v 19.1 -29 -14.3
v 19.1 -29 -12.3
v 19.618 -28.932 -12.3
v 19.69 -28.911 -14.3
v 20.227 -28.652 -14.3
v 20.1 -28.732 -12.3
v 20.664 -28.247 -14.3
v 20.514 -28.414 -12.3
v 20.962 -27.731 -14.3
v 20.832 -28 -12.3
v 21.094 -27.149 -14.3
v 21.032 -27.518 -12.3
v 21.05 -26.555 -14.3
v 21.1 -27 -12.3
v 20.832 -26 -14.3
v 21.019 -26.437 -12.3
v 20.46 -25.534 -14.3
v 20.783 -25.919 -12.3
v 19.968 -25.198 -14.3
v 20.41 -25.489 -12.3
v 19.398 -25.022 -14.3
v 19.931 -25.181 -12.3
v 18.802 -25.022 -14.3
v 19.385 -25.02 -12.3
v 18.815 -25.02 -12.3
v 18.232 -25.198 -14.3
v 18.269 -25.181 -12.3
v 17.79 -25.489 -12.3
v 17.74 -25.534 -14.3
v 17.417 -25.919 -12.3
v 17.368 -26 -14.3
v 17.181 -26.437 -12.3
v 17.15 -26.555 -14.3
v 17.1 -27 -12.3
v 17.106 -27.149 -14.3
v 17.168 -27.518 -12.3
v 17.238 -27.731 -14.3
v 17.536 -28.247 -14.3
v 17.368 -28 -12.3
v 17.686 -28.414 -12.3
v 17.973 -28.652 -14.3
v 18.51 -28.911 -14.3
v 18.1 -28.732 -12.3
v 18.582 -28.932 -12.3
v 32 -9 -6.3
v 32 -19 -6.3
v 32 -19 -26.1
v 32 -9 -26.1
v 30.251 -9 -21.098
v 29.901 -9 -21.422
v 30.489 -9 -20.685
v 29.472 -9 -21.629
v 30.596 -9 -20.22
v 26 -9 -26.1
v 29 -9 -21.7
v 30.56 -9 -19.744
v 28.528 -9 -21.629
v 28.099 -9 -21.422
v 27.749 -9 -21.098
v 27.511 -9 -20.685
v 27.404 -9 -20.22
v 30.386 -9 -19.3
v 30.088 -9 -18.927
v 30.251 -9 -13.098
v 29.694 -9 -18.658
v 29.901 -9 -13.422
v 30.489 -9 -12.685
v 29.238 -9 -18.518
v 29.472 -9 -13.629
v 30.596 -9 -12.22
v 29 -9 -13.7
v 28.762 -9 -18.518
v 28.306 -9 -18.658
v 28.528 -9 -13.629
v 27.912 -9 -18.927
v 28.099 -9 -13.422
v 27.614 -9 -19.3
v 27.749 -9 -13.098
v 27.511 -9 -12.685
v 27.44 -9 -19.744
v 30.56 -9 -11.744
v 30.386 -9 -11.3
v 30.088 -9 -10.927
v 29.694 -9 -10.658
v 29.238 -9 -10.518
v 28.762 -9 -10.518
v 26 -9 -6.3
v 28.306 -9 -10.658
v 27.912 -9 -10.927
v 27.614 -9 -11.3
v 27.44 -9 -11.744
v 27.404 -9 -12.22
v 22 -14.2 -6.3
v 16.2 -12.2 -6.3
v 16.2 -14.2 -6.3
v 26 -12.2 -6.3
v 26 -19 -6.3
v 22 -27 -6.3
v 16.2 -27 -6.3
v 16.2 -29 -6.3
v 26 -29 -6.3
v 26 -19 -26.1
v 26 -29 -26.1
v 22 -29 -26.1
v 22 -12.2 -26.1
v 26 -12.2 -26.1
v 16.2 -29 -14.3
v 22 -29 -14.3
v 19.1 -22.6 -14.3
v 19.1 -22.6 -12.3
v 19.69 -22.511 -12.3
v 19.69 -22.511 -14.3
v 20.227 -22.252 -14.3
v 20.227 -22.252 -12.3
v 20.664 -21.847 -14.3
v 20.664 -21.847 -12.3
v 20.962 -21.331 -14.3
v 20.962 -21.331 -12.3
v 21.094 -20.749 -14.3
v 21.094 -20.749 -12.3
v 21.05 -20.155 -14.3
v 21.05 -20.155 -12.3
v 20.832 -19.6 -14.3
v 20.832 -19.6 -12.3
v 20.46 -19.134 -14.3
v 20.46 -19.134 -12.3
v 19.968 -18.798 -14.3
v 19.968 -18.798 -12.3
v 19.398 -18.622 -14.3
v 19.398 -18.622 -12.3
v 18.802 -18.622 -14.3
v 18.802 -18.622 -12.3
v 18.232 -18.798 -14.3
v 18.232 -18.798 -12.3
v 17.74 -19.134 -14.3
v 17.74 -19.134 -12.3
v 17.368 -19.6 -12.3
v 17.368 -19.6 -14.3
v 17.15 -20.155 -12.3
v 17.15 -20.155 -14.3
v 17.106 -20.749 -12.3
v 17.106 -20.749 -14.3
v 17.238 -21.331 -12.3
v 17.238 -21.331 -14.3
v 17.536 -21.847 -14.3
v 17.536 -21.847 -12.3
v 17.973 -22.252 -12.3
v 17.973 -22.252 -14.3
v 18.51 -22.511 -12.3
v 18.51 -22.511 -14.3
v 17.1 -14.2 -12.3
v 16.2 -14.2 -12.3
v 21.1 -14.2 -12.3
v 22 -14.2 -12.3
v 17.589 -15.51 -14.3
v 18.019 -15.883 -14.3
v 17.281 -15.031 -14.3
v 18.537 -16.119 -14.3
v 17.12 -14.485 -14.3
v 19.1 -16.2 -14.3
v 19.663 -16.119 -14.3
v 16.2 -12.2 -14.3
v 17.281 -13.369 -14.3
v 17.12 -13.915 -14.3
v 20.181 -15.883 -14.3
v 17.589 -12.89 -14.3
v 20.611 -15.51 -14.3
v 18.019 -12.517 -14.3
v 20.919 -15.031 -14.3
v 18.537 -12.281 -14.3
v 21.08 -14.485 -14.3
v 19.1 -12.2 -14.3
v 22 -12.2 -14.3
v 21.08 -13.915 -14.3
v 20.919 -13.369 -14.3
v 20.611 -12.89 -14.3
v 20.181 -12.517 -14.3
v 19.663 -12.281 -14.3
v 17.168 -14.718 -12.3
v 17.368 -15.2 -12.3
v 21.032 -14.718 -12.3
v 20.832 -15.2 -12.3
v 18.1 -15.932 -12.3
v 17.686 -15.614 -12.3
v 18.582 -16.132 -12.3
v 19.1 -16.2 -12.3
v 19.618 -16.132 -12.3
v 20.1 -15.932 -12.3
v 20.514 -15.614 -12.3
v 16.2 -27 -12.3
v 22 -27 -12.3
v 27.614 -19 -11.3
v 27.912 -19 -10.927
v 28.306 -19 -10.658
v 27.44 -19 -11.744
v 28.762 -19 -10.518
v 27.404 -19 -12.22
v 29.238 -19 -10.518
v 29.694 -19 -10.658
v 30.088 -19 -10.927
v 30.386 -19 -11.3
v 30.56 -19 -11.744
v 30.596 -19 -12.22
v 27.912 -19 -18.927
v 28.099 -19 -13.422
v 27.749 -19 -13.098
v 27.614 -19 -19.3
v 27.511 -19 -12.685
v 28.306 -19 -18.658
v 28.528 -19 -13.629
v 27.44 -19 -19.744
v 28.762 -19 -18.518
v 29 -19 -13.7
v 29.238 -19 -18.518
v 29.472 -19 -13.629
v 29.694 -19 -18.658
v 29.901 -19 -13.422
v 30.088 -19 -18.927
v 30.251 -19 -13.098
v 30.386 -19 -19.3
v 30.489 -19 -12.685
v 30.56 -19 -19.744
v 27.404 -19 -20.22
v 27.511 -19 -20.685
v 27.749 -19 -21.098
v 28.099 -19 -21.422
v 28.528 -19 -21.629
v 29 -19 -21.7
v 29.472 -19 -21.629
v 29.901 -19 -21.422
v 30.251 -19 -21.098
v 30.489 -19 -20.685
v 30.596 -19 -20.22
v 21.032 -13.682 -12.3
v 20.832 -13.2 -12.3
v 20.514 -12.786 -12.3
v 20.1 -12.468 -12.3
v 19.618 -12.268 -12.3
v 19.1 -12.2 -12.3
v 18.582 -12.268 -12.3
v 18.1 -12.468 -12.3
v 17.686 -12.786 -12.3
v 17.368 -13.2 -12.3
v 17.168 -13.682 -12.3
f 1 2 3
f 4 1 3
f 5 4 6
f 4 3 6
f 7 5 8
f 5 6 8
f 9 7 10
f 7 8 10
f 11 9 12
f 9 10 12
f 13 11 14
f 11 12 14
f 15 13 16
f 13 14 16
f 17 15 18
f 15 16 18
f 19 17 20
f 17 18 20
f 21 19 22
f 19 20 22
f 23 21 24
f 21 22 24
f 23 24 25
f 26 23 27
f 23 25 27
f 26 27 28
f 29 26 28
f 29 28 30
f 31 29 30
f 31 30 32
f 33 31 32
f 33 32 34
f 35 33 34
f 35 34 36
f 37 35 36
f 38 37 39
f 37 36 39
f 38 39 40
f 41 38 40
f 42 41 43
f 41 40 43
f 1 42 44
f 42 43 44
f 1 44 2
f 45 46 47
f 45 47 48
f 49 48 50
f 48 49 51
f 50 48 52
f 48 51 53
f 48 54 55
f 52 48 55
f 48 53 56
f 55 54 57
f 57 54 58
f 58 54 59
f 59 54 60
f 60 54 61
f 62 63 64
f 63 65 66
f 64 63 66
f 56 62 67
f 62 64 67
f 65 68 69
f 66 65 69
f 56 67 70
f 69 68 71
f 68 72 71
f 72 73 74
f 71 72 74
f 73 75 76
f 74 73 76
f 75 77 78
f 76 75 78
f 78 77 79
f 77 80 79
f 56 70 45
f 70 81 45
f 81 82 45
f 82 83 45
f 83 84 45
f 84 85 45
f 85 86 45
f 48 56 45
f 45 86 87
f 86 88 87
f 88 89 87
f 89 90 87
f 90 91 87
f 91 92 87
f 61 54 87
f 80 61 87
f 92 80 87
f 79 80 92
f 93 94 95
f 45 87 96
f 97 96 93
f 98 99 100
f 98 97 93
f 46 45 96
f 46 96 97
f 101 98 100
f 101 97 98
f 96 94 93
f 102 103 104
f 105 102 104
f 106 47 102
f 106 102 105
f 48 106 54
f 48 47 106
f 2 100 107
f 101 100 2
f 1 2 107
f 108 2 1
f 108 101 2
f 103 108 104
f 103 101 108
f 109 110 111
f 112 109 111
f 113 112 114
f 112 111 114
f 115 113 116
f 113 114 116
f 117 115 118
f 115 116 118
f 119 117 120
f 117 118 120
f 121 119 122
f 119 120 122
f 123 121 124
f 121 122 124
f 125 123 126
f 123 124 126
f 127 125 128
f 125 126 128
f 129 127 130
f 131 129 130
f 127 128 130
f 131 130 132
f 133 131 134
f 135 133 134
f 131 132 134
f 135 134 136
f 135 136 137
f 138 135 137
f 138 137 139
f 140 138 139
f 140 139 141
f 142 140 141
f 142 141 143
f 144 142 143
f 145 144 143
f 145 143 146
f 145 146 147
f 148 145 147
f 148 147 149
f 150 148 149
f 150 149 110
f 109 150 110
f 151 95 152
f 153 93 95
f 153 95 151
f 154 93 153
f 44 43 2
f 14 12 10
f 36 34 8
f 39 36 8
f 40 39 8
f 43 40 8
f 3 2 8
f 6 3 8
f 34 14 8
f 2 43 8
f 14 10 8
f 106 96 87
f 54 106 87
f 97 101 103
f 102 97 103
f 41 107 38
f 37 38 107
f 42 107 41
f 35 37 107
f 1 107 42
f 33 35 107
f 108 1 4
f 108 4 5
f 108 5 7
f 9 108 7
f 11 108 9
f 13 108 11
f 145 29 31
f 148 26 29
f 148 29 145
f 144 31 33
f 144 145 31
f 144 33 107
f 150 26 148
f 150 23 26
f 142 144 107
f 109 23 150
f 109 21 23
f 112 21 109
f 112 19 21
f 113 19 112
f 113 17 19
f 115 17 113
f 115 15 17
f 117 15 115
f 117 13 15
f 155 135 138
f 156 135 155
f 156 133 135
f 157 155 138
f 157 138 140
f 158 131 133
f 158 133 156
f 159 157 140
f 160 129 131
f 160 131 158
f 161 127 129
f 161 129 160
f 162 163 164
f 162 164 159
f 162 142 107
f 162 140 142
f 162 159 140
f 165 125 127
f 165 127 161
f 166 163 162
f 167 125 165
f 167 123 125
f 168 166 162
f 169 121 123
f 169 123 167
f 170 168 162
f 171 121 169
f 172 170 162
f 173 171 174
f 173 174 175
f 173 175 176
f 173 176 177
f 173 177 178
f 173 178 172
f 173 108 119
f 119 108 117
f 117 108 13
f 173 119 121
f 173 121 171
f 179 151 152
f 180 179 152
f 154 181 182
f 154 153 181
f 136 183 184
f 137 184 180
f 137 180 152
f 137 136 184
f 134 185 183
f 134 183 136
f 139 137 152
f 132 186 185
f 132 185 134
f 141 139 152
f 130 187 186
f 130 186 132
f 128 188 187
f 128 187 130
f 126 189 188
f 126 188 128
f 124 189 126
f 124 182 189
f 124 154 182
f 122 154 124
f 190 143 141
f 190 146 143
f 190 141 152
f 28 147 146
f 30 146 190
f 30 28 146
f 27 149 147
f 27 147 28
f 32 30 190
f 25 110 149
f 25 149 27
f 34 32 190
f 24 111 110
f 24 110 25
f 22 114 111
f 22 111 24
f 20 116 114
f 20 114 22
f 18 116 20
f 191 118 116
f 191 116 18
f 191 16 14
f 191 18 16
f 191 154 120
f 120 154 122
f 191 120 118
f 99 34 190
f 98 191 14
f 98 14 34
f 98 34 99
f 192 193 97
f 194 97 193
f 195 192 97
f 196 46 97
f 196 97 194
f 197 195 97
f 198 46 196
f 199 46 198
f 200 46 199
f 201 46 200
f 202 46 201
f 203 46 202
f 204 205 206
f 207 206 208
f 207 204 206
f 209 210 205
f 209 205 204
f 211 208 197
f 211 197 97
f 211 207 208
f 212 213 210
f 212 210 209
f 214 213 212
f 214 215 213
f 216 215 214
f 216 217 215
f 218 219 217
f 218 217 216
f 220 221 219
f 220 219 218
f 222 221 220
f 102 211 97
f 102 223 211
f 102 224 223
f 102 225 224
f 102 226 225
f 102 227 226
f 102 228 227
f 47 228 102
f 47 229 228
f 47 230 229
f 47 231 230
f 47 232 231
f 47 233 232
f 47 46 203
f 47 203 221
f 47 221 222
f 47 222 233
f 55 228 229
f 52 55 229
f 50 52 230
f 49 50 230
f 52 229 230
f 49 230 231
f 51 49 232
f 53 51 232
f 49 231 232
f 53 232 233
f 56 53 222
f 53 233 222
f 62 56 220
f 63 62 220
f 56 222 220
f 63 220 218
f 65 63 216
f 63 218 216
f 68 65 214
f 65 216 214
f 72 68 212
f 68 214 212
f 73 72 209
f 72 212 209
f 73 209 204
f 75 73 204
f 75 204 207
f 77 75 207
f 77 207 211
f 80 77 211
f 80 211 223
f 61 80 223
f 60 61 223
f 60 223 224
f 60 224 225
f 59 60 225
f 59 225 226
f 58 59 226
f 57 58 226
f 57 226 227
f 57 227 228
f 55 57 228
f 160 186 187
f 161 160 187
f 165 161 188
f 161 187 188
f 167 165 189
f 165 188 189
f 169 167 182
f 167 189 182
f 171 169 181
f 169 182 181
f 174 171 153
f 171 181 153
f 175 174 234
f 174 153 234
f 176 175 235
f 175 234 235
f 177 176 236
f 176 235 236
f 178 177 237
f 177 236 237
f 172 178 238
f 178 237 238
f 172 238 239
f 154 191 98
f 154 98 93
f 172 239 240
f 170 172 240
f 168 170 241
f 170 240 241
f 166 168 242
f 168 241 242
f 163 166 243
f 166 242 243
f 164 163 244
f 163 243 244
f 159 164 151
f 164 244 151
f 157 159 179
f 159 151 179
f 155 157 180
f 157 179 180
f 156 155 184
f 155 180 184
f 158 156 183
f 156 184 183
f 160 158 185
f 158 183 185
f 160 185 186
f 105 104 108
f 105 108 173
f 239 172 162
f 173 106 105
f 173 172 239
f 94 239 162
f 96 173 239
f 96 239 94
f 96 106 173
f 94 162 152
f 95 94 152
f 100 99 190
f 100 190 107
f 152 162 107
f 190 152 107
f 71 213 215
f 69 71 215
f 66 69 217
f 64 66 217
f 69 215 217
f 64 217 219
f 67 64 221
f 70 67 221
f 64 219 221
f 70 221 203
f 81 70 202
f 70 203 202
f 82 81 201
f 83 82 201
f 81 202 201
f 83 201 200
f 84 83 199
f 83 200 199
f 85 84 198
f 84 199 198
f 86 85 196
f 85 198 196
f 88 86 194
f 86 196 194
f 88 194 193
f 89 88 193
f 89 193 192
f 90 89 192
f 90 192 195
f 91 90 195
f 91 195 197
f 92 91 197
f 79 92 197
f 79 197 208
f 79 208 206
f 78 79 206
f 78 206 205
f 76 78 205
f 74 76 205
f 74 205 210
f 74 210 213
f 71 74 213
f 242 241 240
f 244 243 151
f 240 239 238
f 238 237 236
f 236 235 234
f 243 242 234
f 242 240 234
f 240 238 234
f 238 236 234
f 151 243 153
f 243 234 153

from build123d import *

# Parameters (mm, degrees)
SKETCH077_W            = 20
SKETCH077_H            = 19.8
PAD046_DEPTH           = 6
SKETCH078_R            = 1.6
POCKET032_DEPTH        = 40
SKETCH079_W            = 16.8
SKETCH079_H            = 19.8
PAD047_DEPTH           = 4
PAD048_DEPTH           = 5.8
SKETCH081_R            = 2
POCKET033_DEPTH        = 5
LINEARPATTERN002_COUNT = 3
LINEARPATTERN002_PITCH = 6.4
SKETCH082_W            = 19.8
SKETCH082_H            = 6
POCKET034_DEPTH        = 10


with BuildPart() as part:
    # Sketch077 → Pad046 (new body)
    with BuildSketch(Plane.YZ):
        with Locations((-6, 0.1)):
            Rectangle(SKETCH077_W, SKETCH077_H)
    extrude(amount=PAD046_DEPTH)

    # Sketch078 (on Face4 of Pad046) → Pocket032 (cut)
    with BuildSketch(Plane(origin=(0, -16, 0), x_dir=(0, 0, -1), z_dir=(0, -1, 0))):
        with Locations((3.8, 3)):
            Circle(SKETCH078_R)
        with Locations((-4.2, 3)):
            Circle(SKETCH078_R)
    extrude(amount=-POCKET032_DEPTH, mode=Mode.SUBTRACT)

    # Sketch079 (on Face4 of Pocket032) → Pad047 (join)
    with BuildSketch(Plane(origin=(0, 0, 0), x_dir=(0, 1, 0), z_dir=(-1, 0, 0))):
        with Locations((-7.6, -0.1)):
            Rectangle(SKETCH079_W, SKETCH079_H)
    extrude(amount=PAD047_DEPTH)

    # Sketch080 (on Face7 of Pad047) → Pad048 (join)
    with BuildSketch(Plane(origin=(-4, 0, 0), x_dir=(0, 1, 0), z_dir=(-1, 0, 0))):
        Polygon((-16, -10), (-16, -2), (0.8, -2), (0.8, -10), (-1.2, -10), (-1.2, -4), (-14, -4), (-14, -10), align=None)
    extrude(amount=PAD048_DEPTH)

    # Sketch081 (on Face13 of Pad048) → Pocket033 (cut)
    with BuildSketch(Plane(origin=(0, 0, 4), x_dir=(0, -1, 0), z_dir=(0, 0, 1))):
        with Locations((1.2, -6.9)):
            Circle(SKETCH081_R)
    pocket033 = extrude(amount=-POCKET033_DEPTH, mode=Mode.SUBTRACT)

    # LinearPattern002: Pocket033 ×3
    with Locations(*[(0, -i * LINEARPATTERN002_PITCH, 0) for i in range(1, LINEARPATTERN002_COUNT)]):
        add(pocket033, mode=Mode.SUBTRACT)

    # Sketch082 (on Face8 of LinearPattern002) → Pocket034 (cut)
    with BuildSketch(Plane(origin=(0, -16, 0), x_dir=(0, 0, -1), z_dir=(0, -1, 0))):
        with Locations((-0.1, 3)):
            Rectangle(SKETCH082_W, SKETCH082_H)
    extrude(amount=-POCKET034_DEPTH, mode=Mode.SUBTRACT)


with BuildPart() as part_1:
    # Body012 placement: moved
    add(part.part.moved(Location((26, -13, -16.3))))


solid = part_1.part
